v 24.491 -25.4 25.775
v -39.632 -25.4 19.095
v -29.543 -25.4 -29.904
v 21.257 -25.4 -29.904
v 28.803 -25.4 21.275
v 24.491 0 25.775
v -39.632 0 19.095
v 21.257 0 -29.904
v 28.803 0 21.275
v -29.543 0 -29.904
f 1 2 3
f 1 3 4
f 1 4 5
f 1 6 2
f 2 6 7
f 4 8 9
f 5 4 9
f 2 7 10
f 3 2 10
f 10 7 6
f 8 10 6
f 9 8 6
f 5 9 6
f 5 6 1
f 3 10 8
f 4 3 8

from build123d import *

# Parameters (mm, degrees)
F1_DEPTH = 25.4
F2_SIZE  = 5.08


with BuildPart() as f1:
    # F0 (on Front) → F1 (new body)
    with BuildSketch(Plane.XZ):
        Polygon((29.543495, 26.300911), (-39.631508, 19.095181), (-29.543485, -29.903777), (21.256905, -29.903777), align=None)
    extrude(amount=F1_DEPTH)

    # F2
    f2_edges = [f1.edges().sort_by_distance(p)[0] for p in [
        (29.543495, -12.7, 26.300911),
    ]]
    chamfer(f2_edges, length=F2_SIZE)


solid = f1.part
